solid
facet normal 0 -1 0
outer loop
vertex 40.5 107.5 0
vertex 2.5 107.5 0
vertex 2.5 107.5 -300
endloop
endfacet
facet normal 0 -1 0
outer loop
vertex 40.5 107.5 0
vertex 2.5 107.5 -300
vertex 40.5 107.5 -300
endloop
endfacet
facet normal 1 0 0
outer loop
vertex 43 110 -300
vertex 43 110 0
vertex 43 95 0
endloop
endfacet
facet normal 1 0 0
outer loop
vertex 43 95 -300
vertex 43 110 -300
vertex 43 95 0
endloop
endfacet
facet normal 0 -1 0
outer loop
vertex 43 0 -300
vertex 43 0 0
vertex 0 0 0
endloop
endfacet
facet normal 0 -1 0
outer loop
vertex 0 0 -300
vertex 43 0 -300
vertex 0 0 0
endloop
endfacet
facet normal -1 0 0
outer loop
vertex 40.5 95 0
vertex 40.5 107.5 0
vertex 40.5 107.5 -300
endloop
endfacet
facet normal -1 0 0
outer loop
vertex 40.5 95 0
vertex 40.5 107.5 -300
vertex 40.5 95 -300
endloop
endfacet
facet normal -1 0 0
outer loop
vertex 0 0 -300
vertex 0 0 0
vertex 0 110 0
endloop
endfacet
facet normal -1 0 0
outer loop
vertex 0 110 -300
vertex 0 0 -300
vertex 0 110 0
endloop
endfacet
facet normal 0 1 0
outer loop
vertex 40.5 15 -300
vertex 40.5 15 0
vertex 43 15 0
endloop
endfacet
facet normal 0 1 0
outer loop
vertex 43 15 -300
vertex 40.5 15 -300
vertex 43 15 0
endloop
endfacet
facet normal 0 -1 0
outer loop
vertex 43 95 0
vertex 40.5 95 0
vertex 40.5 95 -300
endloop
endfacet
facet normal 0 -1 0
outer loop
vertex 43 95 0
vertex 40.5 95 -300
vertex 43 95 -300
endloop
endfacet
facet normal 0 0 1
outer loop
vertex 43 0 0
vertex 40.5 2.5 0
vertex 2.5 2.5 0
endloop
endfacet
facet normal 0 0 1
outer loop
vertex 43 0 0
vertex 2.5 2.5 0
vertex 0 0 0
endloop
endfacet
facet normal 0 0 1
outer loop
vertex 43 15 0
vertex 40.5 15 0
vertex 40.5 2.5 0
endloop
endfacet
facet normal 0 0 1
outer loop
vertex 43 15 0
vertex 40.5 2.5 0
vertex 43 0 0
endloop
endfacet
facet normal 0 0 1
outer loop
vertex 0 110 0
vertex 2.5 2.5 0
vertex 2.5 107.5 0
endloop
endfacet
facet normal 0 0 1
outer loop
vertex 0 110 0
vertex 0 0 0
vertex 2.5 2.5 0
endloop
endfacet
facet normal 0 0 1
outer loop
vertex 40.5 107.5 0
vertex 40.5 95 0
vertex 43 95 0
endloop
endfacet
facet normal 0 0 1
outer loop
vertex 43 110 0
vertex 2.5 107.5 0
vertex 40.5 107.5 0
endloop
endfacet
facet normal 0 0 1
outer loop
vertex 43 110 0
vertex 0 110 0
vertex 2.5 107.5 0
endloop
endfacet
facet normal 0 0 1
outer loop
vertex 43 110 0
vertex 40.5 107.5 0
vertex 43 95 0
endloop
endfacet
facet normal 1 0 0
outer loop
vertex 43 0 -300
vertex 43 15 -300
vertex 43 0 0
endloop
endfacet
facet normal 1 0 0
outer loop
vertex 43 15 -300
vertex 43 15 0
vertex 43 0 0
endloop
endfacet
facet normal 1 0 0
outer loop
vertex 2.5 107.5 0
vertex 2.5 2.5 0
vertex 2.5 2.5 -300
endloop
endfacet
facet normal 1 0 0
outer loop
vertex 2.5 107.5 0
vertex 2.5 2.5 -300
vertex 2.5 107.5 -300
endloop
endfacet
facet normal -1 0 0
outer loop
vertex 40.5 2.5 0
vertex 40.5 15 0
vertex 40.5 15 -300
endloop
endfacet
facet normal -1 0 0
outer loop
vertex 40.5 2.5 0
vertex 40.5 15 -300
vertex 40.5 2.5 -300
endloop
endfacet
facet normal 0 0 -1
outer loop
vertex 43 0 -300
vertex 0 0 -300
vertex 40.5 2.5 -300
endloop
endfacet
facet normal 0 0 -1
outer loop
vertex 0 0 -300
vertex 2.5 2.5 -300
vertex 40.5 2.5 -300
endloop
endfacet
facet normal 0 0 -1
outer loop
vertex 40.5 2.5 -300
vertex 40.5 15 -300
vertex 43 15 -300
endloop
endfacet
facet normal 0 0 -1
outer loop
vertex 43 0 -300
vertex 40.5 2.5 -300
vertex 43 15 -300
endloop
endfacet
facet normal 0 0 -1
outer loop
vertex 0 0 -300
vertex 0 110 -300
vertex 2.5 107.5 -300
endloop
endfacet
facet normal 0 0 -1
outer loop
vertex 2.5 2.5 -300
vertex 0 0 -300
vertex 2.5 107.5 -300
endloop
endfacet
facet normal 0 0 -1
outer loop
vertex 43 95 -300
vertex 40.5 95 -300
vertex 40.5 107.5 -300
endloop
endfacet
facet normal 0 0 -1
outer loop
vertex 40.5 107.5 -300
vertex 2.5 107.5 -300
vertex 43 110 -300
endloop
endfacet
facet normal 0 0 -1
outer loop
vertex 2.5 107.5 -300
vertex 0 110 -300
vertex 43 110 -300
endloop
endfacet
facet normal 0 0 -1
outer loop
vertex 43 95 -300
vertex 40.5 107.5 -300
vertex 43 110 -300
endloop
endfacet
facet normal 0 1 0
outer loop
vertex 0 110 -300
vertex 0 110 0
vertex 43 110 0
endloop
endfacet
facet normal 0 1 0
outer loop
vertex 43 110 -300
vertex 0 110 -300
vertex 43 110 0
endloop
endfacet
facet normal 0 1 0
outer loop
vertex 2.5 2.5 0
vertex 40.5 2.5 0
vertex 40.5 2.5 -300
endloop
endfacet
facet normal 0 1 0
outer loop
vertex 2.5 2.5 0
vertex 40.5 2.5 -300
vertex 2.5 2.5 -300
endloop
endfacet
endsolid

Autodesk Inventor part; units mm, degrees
ref_plane "YZ Plane" through (0, 0, 0) normal (1, 0, 0) x (0, 1, 0)
ref_plane "XZ Plane" through (0, 0, 0) normal (0, 1, 0) x (-1, 0, 0)
ref_plane "XY Plane" through (0, 0, 0) normal (0, 0, 1) x (1, 0, 0)
sketch "Sketch1" plane through (0, 0, 0) normal (0, 0, 1) x (1, 0, 0)
  line L0 (43, 15) -> (43, 0)
  line L1 (43, 0) -> (0, 0)
  line L2 (0, 0) -> (0, 110)
  line L3 (0, 110) -> (43, 110)
  line L4 (43, 110) -> (43, 95)
  line L5 (40.5, 15) -> (40.5, 2.5)
  line L6 (40.5, 2.5) -> (2.5, 2.5)
  line L7 (2.5, 2.5) -> (2.5, 107.5)
  line L8 (2.5, 107.5) -> (40.5, 107.5)
  line L9 (40.5, 107.5) -> (40.5, 95)
  line L10 (40.5, 95) -> (43, 95)
  line L11 (40.5, 15) -> (43, 15)
  dimension "d0" = 43
  dimension "d1" = 110
  dimension "d2" = 15
  dimension "d3" = 15
  dimension "d4" = 2.5
extrude "Extrusion1" add sketch "Sketch1" against normal blind 300
properties part number "c150x43x15x600"
